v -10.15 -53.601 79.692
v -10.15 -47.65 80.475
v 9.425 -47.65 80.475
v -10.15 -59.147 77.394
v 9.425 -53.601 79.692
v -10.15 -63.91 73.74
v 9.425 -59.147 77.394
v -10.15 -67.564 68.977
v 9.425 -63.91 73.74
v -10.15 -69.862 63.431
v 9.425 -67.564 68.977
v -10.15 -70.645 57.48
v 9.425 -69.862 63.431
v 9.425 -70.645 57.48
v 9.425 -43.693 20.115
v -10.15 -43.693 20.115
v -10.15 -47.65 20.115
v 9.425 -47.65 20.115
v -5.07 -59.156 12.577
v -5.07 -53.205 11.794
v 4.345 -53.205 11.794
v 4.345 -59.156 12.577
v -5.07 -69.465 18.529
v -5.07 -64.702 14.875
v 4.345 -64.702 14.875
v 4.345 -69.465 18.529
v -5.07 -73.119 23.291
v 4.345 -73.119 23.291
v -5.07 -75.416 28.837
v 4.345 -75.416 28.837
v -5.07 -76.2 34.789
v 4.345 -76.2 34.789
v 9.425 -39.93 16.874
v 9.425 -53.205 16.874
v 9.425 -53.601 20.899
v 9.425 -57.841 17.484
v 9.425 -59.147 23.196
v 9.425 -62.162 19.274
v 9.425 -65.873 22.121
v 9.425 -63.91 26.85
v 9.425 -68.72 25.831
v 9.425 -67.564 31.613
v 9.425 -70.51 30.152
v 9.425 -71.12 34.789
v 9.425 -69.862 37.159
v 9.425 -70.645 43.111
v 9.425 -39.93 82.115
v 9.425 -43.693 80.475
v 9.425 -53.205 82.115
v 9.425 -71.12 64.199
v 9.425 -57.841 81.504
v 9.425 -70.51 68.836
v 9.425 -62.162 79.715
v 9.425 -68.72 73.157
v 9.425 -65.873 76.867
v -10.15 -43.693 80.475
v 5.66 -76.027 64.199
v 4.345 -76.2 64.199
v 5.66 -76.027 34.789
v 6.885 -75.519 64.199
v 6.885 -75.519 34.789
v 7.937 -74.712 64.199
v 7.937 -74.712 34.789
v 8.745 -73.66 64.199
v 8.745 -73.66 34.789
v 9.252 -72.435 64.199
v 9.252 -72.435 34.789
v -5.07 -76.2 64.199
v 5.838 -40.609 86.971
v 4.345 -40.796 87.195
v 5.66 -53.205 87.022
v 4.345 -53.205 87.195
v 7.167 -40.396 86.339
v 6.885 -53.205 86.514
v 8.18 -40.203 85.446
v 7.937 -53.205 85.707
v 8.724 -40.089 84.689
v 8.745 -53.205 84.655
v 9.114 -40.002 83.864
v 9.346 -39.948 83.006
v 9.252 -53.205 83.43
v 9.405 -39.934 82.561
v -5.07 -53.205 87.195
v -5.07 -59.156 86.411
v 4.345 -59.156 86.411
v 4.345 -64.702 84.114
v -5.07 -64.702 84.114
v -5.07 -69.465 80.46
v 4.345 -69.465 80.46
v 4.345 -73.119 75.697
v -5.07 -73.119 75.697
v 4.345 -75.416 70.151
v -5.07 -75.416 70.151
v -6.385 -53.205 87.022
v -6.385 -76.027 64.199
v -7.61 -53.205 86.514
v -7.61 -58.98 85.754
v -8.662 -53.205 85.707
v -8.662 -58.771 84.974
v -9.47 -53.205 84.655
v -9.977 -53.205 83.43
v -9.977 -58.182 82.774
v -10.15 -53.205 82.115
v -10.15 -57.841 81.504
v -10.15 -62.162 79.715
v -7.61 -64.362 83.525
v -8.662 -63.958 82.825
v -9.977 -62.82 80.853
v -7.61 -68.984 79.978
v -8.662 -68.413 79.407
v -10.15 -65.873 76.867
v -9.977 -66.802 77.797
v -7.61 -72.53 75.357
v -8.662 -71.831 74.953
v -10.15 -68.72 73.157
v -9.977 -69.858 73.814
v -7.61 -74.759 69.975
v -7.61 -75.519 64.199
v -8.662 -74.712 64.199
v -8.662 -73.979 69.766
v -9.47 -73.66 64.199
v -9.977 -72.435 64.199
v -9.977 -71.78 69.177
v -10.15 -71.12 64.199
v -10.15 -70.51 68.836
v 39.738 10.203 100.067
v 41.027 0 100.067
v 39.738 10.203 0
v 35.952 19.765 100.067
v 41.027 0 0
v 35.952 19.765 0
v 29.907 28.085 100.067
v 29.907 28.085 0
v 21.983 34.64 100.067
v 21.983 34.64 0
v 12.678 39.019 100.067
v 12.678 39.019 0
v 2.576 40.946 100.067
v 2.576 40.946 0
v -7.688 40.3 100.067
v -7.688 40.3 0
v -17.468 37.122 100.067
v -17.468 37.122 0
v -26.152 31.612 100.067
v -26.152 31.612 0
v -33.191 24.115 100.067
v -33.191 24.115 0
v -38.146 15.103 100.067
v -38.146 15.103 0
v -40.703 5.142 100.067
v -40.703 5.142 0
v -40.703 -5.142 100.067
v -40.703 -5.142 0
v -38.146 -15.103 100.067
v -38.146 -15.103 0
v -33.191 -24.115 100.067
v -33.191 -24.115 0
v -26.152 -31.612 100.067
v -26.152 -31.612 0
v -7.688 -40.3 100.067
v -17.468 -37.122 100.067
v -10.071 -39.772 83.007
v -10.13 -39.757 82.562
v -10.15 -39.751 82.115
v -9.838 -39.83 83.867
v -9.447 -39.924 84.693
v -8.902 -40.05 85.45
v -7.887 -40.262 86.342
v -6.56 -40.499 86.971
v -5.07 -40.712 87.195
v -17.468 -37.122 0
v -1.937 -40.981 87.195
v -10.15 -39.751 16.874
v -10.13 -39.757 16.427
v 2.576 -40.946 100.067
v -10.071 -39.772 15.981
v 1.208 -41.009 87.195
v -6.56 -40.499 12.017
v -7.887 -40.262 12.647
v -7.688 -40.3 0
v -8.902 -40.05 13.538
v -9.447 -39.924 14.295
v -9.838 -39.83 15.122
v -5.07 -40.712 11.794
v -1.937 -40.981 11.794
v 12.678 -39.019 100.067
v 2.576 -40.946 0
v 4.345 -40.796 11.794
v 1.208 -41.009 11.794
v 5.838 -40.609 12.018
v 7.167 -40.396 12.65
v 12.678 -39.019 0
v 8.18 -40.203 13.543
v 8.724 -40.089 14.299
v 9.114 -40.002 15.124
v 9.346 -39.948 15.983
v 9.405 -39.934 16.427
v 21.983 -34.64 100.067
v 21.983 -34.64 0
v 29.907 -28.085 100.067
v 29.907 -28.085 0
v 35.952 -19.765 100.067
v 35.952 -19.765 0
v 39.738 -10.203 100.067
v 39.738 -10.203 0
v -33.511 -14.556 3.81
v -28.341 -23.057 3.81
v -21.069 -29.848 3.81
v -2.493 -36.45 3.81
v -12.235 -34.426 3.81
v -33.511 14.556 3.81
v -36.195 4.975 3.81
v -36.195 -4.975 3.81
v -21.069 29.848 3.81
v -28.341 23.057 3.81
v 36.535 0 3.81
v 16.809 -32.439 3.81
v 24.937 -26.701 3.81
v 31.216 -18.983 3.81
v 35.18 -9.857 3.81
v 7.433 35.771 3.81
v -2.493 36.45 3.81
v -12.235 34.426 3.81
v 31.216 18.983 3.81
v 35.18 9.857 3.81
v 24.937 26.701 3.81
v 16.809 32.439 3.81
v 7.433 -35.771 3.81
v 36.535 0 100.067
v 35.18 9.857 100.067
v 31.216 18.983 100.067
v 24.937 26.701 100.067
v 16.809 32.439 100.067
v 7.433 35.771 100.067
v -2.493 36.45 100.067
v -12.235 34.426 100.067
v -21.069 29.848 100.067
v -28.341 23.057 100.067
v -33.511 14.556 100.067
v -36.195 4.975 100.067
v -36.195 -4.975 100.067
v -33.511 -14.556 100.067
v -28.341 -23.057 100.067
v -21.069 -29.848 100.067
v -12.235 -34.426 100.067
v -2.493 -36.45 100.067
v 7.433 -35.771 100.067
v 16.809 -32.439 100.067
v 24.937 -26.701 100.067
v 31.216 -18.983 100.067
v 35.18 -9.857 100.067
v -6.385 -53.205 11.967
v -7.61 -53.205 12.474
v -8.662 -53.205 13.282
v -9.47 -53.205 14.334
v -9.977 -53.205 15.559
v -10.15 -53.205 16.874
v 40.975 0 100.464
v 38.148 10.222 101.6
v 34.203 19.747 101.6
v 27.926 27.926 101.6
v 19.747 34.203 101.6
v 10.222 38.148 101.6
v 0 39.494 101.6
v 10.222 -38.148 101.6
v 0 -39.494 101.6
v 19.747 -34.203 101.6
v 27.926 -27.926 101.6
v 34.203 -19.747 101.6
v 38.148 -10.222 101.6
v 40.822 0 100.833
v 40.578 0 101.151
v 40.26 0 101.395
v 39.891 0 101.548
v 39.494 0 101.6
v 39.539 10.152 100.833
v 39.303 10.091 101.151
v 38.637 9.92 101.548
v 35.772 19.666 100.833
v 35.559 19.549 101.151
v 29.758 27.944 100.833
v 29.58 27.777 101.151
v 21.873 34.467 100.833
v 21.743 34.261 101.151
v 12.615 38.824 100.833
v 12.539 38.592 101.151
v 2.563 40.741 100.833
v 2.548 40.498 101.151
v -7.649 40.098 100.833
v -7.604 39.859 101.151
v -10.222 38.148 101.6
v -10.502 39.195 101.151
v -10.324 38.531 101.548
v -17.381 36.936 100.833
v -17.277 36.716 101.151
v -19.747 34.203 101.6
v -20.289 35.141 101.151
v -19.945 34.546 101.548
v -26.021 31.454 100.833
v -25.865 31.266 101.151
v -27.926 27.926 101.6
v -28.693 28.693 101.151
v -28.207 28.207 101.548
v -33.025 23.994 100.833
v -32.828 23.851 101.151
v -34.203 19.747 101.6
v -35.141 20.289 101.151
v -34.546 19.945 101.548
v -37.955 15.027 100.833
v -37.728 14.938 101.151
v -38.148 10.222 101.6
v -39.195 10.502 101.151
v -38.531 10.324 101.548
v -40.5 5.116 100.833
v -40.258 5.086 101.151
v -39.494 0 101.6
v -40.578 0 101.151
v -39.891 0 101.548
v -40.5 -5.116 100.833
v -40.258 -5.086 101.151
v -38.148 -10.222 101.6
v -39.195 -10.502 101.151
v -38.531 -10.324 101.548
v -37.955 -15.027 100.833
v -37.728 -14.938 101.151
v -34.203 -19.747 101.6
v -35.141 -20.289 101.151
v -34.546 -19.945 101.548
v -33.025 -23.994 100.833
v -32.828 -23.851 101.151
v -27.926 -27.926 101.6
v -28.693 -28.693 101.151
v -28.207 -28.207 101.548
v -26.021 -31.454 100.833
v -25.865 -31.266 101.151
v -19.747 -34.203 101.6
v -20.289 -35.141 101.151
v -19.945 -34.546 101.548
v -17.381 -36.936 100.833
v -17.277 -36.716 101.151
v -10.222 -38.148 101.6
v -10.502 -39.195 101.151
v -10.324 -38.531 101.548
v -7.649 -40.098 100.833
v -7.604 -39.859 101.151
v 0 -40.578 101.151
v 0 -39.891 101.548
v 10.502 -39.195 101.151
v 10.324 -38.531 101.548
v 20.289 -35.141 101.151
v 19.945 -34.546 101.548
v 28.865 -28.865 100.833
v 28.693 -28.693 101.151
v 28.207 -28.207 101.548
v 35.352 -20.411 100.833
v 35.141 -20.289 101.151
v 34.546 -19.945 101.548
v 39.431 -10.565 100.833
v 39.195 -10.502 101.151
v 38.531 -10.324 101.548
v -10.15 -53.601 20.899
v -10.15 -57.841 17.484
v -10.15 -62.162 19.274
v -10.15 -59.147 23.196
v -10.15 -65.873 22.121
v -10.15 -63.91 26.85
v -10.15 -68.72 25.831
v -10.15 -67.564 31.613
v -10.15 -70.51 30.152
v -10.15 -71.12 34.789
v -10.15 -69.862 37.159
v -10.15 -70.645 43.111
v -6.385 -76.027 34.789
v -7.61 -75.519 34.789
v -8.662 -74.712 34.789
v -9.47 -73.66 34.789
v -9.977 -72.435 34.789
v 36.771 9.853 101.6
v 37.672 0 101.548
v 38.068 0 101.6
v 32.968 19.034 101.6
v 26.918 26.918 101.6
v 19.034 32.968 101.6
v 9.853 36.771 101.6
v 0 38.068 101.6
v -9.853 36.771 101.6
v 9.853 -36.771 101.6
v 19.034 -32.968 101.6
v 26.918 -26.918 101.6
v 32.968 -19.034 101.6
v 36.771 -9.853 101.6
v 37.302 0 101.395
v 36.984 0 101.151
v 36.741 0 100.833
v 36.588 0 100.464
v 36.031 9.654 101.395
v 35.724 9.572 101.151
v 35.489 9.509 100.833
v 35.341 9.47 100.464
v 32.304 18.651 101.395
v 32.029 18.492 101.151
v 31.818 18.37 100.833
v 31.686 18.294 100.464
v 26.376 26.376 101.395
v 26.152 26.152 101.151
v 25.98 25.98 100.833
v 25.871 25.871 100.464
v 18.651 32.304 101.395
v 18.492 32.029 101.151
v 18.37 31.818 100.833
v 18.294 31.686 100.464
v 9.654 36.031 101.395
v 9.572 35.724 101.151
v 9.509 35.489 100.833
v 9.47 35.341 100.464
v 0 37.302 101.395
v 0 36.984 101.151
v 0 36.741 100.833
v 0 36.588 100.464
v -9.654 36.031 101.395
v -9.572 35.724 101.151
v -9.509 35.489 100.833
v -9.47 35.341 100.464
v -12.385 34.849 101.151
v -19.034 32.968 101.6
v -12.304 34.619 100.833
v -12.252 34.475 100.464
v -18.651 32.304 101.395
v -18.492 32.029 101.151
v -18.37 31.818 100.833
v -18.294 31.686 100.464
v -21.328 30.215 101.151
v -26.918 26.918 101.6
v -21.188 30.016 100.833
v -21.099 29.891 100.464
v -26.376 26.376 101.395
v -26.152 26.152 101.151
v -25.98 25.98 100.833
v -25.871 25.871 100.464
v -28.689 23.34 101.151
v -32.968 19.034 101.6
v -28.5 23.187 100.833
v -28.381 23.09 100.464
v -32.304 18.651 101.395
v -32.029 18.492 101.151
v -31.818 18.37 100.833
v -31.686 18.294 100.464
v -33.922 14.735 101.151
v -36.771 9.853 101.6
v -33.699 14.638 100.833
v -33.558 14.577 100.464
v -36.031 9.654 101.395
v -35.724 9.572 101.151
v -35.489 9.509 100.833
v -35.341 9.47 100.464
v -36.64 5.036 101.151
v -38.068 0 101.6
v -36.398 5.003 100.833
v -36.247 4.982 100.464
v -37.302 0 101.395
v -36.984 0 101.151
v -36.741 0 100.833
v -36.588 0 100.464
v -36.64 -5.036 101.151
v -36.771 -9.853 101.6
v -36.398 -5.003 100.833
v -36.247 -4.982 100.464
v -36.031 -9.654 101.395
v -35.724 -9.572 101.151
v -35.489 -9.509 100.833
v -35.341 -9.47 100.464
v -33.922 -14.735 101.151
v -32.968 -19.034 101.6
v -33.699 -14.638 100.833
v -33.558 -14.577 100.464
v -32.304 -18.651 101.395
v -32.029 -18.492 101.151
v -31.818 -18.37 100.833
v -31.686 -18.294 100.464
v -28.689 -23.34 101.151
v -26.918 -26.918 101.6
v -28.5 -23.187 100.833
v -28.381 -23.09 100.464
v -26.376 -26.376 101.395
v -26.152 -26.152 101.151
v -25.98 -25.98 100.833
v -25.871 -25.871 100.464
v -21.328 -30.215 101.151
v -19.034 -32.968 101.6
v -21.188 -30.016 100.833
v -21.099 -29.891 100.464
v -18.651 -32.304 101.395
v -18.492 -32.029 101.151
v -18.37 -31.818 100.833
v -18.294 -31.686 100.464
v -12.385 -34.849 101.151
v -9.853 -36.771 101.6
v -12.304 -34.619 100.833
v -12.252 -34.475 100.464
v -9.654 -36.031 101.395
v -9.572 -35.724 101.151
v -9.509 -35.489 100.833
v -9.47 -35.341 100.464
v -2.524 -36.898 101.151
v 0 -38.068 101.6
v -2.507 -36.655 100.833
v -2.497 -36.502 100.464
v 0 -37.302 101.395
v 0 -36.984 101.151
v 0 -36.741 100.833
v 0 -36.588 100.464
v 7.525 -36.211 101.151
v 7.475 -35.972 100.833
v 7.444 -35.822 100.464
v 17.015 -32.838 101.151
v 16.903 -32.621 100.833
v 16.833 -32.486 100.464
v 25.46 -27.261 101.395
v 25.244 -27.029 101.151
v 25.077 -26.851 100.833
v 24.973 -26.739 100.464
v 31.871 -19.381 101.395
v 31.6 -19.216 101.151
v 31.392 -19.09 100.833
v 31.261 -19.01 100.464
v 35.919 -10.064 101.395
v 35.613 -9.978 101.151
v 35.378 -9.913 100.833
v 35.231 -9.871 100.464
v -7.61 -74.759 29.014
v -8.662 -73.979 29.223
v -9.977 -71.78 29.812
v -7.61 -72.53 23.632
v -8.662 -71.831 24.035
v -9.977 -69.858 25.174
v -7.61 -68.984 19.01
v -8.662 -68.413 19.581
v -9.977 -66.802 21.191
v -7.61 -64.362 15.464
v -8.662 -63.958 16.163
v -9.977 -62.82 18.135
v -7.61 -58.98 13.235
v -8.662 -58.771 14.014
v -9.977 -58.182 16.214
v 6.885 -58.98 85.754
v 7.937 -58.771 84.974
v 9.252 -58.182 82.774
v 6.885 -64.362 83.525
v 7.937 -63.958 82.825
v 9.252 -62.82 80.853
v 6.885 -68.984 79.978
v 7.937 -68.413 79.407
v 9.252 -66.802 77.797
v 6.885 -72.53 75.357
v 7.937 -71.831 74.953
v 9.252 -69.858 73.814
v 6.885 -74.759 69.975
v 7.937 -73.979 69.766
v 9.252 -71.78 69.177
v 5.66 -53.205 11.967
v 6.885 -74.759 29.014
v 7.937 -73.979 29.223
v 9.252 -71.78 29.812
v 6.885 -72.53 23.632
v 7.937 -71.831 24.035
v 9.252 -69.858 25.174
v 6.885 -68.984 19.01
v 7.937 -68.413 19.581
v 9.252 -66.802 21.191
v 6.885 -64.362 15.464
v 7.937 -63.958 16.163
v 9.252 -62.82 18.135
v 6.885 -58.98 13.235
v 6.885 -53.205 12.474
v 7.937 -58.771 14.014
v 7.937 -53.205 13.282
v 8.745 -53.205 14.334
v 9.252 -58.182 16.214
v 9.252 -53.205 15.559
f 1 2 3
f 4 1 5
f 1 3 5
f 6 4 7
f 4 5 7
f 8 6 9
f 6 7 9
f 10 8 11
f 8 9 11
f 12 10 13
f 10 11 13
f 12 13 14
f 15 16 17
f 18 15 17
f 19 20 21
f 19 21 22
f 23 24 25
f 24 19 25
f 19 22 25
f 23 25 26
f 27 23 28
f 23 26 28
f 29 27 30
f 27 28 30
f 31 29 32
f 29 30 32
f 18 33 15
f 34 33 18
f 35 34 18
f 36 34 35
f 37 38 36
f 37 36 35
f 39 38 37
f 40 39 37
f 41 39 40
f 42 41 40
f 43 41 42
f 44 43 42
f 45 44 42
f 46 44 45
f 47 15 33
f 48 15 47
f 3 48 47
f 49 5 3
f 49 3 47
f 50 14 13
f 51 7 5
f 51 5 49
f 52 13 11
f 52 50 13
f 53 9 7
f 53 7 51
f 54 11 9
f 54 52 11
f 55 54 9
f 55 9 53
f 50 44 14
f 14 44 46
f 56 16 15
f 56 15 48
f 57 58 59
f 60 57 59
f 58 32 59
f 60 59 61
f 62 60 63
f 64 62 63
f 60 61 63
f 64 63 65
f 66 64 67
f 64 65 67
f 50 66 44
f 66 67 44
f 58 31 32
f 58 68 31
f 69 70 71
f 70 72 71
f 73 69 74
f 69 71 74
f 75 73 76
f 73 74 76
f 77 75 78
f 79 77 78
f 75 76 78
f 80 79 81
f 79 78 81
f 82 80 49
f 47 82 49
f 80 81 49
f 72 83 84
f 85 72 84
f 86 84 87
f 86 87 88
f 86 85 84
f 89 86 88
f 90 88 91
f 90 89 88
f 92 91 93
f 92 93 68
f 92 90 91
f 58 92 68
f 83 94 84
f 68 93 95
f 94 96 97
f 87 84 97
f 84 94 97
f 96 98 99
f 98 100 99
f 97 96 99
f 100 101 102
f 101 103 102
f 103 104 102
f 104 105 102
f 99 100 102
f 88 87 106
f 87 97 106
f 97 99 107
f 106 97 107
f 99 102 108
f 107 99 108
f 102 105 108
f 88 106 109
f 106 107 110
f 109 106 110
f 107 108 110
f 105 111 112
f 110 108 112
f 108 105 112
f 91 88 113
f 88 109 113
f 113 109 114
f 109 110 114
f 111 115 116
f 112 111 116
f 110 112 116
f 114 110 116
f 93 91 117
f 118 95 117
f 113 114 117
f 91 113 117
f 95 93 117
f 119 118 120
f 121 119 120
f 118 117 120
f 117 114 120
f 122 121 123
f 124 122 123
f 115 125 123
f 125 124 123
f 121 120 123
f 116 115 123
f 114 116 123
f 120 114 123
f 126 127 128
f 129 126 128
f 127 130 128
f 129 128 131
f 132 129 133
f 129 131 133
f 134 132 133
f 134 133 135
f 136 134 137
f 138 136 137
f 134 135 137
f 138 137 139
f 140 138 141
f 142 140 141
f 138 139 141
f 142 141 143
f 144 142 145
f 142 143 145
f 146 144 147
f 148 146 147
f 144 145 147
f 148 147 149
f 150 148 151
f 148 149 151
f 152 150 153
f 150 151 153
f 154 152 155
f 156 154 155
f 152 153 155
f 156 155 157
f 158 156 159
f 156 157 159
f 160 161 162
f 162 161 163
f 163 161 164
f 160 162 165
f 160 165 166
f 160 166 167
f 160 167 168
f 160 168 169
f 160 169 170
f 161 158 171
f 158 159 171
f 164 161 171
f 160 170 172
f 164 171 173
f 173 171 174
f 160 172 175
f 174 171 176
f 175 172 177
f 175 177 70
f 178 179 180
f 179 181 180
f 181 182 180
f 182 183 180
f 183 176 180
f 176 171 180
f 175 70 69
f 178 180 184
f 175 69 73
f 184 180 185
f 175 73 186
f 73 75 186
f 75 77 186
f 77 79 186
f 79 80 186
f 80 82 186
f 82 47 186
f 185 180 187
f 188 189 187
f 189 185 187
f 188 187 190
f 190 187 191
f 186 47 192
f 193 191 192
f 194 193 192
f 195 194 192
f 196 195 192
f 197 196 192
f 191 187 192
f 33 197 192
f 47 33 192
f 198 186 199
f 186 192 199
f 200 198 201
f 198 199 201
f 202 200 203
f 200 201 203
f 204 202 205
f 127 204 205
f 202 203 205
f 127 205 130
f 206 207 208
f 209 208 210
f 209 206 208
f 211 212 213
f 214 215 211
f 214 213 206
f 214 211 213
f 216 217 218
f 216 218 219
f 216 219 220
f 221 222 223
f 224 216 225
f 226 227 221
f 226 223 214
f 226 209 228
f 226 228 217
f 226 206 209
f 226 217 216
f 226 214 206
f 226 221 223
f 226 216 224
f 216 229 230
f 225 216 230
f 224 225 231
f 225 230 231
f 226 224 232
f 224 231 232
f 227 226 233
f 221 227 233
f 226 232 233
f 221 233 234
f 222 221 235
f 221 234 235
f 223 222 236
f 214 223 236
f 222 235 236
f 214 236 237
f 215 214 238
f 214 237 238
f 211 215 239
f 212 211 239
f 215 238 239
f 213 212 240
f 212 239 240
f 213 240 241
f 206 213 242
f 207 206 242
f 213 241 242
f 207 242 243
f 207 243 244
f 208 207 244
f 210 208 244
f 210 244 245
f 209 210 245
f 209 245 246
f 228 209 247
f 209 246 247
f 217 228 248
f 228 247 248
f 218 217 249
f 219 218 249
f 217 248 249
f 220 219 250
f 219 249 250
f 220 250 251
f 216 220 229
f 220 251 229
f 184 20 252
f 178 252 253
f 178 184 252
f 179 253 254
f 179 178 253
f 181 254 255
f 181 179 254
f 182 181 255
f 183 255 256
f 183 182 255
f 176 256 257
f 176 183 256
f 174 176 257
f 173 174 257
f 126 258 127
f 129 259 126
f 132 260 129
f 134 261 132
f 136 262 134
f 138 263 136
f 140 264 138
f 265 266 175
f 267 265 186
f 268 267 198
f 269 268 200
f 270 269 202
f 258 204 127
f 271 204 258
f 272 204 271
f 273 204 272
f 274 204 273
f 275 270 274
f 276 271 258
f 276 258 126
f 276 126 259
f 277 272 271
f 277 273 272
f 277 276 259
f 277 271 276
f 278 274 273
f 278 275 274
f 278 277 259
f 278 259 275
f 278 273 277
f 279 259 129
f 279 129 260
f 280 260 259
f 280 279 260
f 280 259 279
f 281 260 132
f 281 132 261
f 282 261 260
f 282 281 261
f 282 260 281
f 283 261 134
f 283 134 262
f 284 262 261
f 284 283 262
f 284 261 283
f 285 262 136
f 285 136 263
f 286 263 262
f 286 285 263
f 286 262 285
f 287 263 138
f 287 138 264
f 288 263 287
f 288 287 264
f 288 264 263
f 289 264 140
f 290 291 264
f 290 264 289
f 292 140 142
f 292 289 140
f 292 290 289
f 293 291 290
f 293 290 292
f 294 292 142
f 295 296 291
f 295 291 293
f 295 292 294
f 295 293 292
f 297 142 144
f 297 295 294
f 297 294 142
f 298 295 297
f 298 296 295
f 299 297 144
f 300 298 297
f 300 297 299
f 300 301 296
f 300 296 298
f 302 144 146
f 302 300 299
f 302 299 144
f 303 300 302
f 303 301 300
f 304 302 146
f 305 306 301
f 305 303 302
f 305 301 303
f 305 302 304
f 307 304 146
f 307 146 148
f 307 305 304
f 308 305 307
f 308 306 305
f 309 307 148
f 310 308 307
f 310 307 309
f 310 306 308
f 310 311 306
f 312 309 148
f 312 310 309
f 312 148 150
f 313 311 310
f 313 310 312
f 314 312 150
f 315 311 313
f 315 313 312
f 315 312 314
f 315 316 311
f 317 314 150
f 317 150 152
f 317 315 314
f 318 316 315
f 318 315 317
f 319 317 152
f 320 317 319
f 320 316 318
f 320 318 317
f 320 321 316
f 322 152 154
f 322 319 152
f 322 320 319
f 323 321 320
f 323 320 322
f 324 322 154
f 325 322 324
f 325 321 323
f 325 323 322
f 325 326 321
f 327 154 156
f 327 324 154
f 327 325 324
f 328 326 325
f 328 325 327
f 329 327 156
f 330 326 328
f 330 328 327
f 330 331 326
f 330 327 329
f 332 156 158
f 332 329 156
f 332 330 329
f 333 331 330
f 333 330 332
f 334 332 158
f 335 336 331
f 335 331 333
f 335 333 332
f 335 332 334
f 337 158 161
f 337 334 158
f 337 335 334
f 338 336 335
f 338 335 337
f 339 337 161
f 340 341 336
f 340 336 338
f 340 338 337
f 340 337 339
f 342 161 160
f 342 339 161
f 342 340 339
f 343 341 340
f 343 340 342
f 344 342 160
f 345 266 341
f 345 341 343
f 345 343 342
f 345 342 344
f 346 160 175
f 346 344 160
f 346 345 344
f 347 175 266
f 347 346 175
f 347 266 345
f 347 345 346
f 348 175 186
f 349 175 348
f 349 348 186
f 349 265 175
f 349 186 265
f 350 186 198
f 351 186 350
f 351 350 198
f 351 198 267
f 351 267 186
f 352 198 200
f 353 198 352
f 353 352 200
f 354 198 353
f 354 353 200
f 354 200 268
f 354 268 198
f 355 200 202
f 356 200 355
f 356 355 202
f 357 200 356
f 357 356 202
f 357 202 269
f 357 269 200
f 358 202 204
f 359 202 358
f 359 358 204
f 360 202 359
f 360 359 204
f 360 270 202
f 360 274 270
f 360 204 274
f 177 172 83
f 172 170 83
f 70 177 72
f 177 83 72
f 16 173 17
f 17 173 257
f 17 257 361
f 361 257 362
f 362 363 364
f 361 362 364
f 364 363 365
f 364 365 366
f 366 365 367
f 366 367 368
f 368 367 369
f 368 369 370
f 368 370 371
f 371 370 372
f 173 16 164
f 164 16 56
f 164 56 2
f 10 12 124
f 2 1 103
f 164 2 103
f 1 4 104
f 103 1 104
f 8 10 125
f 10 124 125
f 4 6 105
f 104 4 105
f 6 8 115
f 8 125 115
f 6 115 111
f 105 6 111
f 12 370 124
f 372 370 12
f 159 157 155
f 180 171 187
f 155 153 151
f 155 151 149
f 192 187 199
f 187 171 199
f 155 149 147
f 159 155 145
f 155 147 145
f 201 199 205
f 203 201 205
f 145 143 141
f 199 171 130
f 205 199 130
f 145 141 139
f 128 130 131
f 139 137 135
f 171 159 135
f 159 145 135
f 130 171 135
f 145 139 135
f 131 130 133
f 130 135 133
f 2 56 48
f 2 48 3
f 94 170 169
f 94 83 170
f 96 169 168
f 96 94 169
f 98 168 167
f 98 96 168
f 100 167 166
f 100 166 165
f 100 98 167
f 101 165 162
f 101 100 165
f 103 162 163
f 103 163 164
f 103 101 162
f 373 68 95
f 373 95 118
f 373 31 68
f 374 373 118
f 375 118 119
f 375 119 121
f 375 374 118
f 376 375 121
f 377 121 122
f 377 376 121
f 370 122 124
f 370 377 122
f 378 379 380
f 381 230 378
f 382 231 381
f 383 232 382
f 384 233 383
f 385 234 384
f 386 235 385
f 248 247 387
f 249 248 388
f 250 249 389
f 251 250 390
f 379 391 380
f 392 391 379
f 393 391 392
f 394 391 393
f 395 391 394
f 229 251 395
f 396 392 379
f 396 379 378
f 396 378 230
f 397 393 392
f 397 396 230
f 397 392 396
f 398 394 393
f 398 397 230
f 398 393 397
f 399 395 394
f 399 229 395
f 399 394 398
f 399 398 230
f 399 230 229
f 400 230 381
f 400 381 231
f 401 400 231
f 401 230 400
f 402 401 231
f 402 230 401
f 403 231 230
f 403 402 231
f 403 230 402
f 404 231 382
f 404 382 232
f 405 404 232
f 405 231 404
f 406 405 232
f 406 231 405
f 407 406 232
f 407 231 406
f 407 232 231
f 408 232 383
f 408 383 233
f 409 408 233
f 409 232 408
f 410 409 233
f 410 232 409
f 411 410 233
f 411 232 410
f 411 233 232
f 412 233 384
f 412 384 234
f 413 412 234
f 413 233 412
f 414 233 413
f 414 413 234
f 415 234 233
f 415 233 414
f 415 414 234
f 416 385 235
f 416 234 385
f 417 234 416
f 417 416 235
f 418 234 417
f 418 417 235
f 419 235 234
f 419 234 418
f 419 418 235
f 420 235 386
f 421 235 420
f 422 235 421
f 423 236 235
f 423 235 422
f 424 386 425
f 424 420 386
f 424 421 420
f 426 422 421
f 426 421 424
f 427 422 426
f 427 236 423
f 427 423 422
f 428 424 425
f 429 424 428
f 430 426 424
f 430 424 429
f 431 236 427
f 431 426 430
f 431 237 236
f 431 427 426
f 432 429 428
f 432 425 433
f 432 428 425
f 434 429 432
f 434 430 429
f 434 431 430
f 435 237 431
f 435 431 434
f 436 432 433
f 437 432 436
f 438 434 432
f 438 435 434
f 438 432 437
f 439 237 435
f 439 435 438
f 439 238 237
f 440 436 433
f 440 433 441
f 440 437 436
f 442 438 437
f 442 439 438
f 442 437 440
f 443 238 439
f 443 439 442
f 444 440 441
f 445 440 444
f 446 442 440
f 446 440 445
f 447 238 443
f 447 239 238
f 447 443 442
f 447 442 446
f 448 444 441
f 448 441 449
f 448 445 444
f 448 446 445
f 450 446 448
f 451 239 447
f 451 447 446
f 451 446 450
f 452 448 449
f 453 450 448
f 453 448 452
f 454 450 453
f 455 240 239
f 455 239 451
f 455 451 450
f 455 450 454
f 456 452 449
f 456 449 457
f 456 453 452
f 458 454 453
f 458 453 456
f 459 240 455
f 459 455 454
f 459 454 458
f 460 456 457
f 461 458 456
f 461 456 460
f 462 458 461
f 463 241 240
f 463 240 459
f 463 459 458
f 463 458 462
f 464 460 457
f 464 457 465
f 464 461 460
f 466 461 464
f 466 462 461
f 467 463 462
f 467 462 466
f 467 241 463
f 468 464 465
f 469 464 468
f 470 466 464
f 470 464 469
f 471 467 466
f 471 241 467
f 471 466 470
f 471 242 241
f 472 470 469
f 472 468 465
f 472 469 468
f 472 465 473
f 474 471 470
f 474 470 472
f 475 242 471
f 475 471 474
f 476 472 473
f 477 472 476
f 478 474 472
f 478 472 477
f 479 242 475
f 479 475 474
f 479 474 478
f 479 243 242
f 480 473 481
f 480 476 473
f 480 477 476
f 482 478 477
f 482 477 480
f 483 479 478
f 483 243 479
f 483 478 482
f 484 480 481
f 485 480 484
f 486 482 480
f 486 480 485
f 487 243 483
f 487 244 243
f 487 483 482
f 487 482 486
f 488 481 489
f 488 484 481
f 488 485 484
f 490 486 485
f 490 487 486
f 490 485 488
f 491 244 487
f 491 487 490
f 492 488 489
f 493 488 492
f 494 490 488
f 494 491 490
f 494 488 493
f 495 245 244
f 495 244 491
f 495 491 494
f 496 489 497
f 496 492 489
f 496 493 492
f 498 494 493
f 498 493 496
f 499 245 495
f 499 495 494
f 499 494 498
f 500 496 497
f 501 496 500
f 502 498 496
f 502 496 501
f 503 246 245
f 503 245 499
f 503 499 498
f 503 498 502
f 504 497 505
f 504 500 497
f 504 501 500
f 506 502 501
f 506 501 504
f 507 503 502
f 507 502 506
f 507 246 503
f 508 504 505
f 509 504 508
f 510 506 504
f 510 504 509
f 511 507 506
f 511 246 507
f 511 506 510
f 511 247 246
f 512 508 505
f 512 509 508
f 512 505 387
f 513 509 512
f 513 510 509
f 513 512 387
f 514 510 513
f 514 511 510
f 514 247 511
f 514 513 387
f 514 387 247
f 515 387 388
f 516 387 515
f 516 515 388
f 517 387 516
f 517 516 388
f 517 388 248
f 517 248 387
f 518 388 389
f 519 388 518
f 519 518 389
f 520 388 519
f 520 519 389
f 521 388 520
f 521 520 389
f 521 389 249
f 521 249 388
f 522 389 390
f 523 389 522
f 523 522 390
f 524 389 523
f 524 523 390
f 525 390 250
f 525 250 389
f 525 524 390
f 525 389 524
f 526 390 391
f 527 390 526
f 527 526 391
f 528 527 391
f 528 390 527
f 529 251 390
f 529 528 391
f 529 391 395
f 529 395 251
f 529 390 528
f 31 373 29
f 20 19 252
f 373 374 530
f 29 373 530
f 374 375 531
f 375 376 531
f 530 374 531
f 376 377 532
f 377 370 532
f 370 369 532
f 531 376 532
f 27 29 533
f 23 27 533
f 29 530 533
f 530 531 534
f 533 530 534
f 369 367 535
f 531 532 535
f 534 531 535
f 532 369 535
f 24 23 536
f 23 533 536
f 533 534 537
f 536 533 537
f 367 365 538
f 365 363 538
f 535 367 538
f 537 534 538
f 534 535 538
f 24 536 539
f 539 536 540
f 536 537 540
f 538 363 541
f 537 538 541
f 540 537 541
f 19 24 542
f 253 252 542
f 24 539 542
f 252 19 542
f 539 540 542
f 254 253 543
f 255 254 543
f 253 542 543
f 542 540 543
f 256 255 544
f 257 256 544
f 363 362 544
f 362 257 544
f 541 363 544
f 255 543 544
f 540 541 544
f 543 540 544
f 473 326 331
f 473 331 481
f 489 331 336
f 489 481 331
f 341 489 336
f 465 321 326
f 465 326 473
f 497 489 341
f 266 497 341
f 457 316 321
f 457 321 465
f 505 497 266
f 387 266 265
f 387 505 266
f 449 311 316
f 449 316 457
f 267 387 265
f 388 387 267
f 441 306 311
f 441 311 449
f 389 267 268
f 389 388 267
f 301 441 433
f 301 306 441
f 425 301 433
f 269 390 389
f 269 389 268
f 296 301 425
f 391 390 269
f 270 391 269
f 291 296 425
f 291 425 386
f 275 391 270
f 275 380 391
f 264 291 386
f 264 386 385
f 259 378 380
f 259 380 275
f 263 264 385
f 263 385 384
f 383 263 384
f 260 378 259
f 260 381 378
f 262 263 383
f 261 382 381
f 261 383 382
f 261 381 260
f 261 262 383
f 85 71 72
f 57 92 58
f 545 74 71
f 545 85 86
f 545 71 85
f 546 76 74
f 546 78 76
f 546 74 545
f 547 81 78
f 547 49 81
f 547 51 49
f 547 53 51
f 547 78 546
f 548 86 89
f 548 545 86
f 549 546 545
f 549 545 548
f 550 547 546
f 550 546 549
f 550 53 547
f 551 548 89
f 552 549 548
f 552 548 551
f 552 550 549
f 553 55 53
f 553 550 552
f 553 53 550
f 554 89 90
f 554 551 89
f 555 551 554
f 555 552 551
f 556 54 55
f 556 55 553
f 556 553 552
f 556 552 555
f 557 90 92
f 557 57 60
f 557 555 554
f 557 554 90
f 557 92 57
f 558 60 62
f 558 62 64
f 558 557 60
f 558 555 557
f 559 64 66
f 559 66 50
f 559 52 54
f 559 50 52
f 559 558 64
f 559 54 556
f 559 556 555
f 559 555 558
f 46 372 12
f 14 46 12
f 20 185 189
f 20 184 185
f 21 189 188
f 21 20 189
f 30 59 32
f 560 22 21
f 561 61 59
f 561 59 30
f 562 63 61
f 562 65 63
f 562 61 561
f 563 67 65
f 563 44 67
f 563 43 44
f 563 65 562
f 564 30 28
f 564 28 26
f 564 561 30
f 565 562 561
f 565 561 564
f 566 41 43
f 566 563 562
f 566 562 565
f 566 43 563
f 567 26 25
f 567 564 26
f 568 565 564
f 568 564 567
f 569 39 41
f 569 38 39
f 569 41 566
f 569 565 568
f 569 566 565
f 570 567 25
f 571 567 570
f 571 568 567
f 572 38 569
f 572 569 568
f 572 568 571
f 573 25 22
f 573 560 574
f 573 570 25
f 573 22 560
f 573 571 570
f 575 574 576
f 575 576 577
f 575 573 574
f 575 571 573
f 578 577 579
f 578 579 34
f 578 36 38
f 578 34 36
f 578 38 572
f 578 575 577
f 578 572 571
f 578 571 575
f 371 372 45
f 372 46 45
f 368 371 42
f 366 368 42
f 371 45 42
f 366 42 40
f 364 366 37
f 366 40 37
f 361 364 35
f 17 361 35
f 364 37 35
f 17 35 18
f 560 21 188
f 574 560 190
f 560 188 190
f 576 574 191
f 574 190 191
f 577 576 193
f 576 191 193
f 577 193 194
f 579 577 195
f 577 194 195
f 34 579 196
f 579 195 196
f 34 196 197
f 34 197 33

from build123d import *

# Parameters (mm, degrees)
F0_R     = 41.0268992287
F1_DEPTH = 101.6
F2_R     = 36.535273012
F3_DEPTH = 97.79
F4_R     = 1.5330256121
F6_W     = 19.5752624422
F6_H     = 75.4010118544
F8_W     = 26.9523151219
F8_H     = 60.3598859161
F9_DEPTH = 51.1780356548
F10_R    = 22.9953841816
F11_R    = 5.08
F12_R    = 5.08


with BuildPart() as f1:
    # F0 (on Top) → F1 (new body)
    with BuildSketch(Plane.XY):
        Circle(F0_R)
    extrude(amount=F1_DEPTH)

    # F2 (on face) → F3 (cut)
    with BuildSketch(Plane.XY.offset(101.6)):
        Circle(F2_R)
    extrude(amount=-F3_DEPTH, mode=Mode.SUBTRACT)

    # F4
    f4_edges = [f1.edges().sort_by_distance(p)[0] for p in [
        (-36.535273, 0, 101.6),
        (-41.026899, 0, 101.6),
    ]]
    fillet(f4_edges, radius=F4_R)

    # F6 (on offset) → F7 (join, up to the next surface of F1)
    with BuildSketch(Plane.XZ.offset(76.2)):
        with Locations((-0.362505205, 49.4942422956)):
            Rectangle(F6_W, F6_H)
    extrude(until=Until.NEXT, dir=(0, 1, 0))

    # F8 (on face) → F9 (cut, through all)
    with BuildSketch(Plane(origin=(-10.1501364261, 0, 0), x_dir=(0, -1, 0), z_dir=(-1, 0, 0))):
        with Locations((57.1689289063, 50.295223482)):
            Rectangle(F8_W, F8_H)
    extrude(amount=-F9_DEPTH, mode=Mode.SUBTRACT)

    # F10
    f10_edges = [f1.edges().sort_by_distance(p)[0] for p in [
        (-0.362505, -76.2, 87.194748),
        (-0.362505, -76.2, 11.793736),
        (-0.362505, -70.645086, 20.115281),
        (-0.362505, -70.645086, 80.475166),
    ]]
    fillet(f10_edges, radius=F10_R)

    # F11
    f11_edges = [f1.edges().sort_by_distance(p)[0] for p in [
        (-10.150136, -69.464808, 80.459556),
    ]]
    fillet(f11_edges, radius=F11_R)

    # F12
    f12_edges = [f1.edges().sort_by_distance(p)[0] for p in [
        (9.425126, -69.464808, 80.459556),
    ]]
    fillet(f12_edges, radius=F12_R)


solid = f1.part
